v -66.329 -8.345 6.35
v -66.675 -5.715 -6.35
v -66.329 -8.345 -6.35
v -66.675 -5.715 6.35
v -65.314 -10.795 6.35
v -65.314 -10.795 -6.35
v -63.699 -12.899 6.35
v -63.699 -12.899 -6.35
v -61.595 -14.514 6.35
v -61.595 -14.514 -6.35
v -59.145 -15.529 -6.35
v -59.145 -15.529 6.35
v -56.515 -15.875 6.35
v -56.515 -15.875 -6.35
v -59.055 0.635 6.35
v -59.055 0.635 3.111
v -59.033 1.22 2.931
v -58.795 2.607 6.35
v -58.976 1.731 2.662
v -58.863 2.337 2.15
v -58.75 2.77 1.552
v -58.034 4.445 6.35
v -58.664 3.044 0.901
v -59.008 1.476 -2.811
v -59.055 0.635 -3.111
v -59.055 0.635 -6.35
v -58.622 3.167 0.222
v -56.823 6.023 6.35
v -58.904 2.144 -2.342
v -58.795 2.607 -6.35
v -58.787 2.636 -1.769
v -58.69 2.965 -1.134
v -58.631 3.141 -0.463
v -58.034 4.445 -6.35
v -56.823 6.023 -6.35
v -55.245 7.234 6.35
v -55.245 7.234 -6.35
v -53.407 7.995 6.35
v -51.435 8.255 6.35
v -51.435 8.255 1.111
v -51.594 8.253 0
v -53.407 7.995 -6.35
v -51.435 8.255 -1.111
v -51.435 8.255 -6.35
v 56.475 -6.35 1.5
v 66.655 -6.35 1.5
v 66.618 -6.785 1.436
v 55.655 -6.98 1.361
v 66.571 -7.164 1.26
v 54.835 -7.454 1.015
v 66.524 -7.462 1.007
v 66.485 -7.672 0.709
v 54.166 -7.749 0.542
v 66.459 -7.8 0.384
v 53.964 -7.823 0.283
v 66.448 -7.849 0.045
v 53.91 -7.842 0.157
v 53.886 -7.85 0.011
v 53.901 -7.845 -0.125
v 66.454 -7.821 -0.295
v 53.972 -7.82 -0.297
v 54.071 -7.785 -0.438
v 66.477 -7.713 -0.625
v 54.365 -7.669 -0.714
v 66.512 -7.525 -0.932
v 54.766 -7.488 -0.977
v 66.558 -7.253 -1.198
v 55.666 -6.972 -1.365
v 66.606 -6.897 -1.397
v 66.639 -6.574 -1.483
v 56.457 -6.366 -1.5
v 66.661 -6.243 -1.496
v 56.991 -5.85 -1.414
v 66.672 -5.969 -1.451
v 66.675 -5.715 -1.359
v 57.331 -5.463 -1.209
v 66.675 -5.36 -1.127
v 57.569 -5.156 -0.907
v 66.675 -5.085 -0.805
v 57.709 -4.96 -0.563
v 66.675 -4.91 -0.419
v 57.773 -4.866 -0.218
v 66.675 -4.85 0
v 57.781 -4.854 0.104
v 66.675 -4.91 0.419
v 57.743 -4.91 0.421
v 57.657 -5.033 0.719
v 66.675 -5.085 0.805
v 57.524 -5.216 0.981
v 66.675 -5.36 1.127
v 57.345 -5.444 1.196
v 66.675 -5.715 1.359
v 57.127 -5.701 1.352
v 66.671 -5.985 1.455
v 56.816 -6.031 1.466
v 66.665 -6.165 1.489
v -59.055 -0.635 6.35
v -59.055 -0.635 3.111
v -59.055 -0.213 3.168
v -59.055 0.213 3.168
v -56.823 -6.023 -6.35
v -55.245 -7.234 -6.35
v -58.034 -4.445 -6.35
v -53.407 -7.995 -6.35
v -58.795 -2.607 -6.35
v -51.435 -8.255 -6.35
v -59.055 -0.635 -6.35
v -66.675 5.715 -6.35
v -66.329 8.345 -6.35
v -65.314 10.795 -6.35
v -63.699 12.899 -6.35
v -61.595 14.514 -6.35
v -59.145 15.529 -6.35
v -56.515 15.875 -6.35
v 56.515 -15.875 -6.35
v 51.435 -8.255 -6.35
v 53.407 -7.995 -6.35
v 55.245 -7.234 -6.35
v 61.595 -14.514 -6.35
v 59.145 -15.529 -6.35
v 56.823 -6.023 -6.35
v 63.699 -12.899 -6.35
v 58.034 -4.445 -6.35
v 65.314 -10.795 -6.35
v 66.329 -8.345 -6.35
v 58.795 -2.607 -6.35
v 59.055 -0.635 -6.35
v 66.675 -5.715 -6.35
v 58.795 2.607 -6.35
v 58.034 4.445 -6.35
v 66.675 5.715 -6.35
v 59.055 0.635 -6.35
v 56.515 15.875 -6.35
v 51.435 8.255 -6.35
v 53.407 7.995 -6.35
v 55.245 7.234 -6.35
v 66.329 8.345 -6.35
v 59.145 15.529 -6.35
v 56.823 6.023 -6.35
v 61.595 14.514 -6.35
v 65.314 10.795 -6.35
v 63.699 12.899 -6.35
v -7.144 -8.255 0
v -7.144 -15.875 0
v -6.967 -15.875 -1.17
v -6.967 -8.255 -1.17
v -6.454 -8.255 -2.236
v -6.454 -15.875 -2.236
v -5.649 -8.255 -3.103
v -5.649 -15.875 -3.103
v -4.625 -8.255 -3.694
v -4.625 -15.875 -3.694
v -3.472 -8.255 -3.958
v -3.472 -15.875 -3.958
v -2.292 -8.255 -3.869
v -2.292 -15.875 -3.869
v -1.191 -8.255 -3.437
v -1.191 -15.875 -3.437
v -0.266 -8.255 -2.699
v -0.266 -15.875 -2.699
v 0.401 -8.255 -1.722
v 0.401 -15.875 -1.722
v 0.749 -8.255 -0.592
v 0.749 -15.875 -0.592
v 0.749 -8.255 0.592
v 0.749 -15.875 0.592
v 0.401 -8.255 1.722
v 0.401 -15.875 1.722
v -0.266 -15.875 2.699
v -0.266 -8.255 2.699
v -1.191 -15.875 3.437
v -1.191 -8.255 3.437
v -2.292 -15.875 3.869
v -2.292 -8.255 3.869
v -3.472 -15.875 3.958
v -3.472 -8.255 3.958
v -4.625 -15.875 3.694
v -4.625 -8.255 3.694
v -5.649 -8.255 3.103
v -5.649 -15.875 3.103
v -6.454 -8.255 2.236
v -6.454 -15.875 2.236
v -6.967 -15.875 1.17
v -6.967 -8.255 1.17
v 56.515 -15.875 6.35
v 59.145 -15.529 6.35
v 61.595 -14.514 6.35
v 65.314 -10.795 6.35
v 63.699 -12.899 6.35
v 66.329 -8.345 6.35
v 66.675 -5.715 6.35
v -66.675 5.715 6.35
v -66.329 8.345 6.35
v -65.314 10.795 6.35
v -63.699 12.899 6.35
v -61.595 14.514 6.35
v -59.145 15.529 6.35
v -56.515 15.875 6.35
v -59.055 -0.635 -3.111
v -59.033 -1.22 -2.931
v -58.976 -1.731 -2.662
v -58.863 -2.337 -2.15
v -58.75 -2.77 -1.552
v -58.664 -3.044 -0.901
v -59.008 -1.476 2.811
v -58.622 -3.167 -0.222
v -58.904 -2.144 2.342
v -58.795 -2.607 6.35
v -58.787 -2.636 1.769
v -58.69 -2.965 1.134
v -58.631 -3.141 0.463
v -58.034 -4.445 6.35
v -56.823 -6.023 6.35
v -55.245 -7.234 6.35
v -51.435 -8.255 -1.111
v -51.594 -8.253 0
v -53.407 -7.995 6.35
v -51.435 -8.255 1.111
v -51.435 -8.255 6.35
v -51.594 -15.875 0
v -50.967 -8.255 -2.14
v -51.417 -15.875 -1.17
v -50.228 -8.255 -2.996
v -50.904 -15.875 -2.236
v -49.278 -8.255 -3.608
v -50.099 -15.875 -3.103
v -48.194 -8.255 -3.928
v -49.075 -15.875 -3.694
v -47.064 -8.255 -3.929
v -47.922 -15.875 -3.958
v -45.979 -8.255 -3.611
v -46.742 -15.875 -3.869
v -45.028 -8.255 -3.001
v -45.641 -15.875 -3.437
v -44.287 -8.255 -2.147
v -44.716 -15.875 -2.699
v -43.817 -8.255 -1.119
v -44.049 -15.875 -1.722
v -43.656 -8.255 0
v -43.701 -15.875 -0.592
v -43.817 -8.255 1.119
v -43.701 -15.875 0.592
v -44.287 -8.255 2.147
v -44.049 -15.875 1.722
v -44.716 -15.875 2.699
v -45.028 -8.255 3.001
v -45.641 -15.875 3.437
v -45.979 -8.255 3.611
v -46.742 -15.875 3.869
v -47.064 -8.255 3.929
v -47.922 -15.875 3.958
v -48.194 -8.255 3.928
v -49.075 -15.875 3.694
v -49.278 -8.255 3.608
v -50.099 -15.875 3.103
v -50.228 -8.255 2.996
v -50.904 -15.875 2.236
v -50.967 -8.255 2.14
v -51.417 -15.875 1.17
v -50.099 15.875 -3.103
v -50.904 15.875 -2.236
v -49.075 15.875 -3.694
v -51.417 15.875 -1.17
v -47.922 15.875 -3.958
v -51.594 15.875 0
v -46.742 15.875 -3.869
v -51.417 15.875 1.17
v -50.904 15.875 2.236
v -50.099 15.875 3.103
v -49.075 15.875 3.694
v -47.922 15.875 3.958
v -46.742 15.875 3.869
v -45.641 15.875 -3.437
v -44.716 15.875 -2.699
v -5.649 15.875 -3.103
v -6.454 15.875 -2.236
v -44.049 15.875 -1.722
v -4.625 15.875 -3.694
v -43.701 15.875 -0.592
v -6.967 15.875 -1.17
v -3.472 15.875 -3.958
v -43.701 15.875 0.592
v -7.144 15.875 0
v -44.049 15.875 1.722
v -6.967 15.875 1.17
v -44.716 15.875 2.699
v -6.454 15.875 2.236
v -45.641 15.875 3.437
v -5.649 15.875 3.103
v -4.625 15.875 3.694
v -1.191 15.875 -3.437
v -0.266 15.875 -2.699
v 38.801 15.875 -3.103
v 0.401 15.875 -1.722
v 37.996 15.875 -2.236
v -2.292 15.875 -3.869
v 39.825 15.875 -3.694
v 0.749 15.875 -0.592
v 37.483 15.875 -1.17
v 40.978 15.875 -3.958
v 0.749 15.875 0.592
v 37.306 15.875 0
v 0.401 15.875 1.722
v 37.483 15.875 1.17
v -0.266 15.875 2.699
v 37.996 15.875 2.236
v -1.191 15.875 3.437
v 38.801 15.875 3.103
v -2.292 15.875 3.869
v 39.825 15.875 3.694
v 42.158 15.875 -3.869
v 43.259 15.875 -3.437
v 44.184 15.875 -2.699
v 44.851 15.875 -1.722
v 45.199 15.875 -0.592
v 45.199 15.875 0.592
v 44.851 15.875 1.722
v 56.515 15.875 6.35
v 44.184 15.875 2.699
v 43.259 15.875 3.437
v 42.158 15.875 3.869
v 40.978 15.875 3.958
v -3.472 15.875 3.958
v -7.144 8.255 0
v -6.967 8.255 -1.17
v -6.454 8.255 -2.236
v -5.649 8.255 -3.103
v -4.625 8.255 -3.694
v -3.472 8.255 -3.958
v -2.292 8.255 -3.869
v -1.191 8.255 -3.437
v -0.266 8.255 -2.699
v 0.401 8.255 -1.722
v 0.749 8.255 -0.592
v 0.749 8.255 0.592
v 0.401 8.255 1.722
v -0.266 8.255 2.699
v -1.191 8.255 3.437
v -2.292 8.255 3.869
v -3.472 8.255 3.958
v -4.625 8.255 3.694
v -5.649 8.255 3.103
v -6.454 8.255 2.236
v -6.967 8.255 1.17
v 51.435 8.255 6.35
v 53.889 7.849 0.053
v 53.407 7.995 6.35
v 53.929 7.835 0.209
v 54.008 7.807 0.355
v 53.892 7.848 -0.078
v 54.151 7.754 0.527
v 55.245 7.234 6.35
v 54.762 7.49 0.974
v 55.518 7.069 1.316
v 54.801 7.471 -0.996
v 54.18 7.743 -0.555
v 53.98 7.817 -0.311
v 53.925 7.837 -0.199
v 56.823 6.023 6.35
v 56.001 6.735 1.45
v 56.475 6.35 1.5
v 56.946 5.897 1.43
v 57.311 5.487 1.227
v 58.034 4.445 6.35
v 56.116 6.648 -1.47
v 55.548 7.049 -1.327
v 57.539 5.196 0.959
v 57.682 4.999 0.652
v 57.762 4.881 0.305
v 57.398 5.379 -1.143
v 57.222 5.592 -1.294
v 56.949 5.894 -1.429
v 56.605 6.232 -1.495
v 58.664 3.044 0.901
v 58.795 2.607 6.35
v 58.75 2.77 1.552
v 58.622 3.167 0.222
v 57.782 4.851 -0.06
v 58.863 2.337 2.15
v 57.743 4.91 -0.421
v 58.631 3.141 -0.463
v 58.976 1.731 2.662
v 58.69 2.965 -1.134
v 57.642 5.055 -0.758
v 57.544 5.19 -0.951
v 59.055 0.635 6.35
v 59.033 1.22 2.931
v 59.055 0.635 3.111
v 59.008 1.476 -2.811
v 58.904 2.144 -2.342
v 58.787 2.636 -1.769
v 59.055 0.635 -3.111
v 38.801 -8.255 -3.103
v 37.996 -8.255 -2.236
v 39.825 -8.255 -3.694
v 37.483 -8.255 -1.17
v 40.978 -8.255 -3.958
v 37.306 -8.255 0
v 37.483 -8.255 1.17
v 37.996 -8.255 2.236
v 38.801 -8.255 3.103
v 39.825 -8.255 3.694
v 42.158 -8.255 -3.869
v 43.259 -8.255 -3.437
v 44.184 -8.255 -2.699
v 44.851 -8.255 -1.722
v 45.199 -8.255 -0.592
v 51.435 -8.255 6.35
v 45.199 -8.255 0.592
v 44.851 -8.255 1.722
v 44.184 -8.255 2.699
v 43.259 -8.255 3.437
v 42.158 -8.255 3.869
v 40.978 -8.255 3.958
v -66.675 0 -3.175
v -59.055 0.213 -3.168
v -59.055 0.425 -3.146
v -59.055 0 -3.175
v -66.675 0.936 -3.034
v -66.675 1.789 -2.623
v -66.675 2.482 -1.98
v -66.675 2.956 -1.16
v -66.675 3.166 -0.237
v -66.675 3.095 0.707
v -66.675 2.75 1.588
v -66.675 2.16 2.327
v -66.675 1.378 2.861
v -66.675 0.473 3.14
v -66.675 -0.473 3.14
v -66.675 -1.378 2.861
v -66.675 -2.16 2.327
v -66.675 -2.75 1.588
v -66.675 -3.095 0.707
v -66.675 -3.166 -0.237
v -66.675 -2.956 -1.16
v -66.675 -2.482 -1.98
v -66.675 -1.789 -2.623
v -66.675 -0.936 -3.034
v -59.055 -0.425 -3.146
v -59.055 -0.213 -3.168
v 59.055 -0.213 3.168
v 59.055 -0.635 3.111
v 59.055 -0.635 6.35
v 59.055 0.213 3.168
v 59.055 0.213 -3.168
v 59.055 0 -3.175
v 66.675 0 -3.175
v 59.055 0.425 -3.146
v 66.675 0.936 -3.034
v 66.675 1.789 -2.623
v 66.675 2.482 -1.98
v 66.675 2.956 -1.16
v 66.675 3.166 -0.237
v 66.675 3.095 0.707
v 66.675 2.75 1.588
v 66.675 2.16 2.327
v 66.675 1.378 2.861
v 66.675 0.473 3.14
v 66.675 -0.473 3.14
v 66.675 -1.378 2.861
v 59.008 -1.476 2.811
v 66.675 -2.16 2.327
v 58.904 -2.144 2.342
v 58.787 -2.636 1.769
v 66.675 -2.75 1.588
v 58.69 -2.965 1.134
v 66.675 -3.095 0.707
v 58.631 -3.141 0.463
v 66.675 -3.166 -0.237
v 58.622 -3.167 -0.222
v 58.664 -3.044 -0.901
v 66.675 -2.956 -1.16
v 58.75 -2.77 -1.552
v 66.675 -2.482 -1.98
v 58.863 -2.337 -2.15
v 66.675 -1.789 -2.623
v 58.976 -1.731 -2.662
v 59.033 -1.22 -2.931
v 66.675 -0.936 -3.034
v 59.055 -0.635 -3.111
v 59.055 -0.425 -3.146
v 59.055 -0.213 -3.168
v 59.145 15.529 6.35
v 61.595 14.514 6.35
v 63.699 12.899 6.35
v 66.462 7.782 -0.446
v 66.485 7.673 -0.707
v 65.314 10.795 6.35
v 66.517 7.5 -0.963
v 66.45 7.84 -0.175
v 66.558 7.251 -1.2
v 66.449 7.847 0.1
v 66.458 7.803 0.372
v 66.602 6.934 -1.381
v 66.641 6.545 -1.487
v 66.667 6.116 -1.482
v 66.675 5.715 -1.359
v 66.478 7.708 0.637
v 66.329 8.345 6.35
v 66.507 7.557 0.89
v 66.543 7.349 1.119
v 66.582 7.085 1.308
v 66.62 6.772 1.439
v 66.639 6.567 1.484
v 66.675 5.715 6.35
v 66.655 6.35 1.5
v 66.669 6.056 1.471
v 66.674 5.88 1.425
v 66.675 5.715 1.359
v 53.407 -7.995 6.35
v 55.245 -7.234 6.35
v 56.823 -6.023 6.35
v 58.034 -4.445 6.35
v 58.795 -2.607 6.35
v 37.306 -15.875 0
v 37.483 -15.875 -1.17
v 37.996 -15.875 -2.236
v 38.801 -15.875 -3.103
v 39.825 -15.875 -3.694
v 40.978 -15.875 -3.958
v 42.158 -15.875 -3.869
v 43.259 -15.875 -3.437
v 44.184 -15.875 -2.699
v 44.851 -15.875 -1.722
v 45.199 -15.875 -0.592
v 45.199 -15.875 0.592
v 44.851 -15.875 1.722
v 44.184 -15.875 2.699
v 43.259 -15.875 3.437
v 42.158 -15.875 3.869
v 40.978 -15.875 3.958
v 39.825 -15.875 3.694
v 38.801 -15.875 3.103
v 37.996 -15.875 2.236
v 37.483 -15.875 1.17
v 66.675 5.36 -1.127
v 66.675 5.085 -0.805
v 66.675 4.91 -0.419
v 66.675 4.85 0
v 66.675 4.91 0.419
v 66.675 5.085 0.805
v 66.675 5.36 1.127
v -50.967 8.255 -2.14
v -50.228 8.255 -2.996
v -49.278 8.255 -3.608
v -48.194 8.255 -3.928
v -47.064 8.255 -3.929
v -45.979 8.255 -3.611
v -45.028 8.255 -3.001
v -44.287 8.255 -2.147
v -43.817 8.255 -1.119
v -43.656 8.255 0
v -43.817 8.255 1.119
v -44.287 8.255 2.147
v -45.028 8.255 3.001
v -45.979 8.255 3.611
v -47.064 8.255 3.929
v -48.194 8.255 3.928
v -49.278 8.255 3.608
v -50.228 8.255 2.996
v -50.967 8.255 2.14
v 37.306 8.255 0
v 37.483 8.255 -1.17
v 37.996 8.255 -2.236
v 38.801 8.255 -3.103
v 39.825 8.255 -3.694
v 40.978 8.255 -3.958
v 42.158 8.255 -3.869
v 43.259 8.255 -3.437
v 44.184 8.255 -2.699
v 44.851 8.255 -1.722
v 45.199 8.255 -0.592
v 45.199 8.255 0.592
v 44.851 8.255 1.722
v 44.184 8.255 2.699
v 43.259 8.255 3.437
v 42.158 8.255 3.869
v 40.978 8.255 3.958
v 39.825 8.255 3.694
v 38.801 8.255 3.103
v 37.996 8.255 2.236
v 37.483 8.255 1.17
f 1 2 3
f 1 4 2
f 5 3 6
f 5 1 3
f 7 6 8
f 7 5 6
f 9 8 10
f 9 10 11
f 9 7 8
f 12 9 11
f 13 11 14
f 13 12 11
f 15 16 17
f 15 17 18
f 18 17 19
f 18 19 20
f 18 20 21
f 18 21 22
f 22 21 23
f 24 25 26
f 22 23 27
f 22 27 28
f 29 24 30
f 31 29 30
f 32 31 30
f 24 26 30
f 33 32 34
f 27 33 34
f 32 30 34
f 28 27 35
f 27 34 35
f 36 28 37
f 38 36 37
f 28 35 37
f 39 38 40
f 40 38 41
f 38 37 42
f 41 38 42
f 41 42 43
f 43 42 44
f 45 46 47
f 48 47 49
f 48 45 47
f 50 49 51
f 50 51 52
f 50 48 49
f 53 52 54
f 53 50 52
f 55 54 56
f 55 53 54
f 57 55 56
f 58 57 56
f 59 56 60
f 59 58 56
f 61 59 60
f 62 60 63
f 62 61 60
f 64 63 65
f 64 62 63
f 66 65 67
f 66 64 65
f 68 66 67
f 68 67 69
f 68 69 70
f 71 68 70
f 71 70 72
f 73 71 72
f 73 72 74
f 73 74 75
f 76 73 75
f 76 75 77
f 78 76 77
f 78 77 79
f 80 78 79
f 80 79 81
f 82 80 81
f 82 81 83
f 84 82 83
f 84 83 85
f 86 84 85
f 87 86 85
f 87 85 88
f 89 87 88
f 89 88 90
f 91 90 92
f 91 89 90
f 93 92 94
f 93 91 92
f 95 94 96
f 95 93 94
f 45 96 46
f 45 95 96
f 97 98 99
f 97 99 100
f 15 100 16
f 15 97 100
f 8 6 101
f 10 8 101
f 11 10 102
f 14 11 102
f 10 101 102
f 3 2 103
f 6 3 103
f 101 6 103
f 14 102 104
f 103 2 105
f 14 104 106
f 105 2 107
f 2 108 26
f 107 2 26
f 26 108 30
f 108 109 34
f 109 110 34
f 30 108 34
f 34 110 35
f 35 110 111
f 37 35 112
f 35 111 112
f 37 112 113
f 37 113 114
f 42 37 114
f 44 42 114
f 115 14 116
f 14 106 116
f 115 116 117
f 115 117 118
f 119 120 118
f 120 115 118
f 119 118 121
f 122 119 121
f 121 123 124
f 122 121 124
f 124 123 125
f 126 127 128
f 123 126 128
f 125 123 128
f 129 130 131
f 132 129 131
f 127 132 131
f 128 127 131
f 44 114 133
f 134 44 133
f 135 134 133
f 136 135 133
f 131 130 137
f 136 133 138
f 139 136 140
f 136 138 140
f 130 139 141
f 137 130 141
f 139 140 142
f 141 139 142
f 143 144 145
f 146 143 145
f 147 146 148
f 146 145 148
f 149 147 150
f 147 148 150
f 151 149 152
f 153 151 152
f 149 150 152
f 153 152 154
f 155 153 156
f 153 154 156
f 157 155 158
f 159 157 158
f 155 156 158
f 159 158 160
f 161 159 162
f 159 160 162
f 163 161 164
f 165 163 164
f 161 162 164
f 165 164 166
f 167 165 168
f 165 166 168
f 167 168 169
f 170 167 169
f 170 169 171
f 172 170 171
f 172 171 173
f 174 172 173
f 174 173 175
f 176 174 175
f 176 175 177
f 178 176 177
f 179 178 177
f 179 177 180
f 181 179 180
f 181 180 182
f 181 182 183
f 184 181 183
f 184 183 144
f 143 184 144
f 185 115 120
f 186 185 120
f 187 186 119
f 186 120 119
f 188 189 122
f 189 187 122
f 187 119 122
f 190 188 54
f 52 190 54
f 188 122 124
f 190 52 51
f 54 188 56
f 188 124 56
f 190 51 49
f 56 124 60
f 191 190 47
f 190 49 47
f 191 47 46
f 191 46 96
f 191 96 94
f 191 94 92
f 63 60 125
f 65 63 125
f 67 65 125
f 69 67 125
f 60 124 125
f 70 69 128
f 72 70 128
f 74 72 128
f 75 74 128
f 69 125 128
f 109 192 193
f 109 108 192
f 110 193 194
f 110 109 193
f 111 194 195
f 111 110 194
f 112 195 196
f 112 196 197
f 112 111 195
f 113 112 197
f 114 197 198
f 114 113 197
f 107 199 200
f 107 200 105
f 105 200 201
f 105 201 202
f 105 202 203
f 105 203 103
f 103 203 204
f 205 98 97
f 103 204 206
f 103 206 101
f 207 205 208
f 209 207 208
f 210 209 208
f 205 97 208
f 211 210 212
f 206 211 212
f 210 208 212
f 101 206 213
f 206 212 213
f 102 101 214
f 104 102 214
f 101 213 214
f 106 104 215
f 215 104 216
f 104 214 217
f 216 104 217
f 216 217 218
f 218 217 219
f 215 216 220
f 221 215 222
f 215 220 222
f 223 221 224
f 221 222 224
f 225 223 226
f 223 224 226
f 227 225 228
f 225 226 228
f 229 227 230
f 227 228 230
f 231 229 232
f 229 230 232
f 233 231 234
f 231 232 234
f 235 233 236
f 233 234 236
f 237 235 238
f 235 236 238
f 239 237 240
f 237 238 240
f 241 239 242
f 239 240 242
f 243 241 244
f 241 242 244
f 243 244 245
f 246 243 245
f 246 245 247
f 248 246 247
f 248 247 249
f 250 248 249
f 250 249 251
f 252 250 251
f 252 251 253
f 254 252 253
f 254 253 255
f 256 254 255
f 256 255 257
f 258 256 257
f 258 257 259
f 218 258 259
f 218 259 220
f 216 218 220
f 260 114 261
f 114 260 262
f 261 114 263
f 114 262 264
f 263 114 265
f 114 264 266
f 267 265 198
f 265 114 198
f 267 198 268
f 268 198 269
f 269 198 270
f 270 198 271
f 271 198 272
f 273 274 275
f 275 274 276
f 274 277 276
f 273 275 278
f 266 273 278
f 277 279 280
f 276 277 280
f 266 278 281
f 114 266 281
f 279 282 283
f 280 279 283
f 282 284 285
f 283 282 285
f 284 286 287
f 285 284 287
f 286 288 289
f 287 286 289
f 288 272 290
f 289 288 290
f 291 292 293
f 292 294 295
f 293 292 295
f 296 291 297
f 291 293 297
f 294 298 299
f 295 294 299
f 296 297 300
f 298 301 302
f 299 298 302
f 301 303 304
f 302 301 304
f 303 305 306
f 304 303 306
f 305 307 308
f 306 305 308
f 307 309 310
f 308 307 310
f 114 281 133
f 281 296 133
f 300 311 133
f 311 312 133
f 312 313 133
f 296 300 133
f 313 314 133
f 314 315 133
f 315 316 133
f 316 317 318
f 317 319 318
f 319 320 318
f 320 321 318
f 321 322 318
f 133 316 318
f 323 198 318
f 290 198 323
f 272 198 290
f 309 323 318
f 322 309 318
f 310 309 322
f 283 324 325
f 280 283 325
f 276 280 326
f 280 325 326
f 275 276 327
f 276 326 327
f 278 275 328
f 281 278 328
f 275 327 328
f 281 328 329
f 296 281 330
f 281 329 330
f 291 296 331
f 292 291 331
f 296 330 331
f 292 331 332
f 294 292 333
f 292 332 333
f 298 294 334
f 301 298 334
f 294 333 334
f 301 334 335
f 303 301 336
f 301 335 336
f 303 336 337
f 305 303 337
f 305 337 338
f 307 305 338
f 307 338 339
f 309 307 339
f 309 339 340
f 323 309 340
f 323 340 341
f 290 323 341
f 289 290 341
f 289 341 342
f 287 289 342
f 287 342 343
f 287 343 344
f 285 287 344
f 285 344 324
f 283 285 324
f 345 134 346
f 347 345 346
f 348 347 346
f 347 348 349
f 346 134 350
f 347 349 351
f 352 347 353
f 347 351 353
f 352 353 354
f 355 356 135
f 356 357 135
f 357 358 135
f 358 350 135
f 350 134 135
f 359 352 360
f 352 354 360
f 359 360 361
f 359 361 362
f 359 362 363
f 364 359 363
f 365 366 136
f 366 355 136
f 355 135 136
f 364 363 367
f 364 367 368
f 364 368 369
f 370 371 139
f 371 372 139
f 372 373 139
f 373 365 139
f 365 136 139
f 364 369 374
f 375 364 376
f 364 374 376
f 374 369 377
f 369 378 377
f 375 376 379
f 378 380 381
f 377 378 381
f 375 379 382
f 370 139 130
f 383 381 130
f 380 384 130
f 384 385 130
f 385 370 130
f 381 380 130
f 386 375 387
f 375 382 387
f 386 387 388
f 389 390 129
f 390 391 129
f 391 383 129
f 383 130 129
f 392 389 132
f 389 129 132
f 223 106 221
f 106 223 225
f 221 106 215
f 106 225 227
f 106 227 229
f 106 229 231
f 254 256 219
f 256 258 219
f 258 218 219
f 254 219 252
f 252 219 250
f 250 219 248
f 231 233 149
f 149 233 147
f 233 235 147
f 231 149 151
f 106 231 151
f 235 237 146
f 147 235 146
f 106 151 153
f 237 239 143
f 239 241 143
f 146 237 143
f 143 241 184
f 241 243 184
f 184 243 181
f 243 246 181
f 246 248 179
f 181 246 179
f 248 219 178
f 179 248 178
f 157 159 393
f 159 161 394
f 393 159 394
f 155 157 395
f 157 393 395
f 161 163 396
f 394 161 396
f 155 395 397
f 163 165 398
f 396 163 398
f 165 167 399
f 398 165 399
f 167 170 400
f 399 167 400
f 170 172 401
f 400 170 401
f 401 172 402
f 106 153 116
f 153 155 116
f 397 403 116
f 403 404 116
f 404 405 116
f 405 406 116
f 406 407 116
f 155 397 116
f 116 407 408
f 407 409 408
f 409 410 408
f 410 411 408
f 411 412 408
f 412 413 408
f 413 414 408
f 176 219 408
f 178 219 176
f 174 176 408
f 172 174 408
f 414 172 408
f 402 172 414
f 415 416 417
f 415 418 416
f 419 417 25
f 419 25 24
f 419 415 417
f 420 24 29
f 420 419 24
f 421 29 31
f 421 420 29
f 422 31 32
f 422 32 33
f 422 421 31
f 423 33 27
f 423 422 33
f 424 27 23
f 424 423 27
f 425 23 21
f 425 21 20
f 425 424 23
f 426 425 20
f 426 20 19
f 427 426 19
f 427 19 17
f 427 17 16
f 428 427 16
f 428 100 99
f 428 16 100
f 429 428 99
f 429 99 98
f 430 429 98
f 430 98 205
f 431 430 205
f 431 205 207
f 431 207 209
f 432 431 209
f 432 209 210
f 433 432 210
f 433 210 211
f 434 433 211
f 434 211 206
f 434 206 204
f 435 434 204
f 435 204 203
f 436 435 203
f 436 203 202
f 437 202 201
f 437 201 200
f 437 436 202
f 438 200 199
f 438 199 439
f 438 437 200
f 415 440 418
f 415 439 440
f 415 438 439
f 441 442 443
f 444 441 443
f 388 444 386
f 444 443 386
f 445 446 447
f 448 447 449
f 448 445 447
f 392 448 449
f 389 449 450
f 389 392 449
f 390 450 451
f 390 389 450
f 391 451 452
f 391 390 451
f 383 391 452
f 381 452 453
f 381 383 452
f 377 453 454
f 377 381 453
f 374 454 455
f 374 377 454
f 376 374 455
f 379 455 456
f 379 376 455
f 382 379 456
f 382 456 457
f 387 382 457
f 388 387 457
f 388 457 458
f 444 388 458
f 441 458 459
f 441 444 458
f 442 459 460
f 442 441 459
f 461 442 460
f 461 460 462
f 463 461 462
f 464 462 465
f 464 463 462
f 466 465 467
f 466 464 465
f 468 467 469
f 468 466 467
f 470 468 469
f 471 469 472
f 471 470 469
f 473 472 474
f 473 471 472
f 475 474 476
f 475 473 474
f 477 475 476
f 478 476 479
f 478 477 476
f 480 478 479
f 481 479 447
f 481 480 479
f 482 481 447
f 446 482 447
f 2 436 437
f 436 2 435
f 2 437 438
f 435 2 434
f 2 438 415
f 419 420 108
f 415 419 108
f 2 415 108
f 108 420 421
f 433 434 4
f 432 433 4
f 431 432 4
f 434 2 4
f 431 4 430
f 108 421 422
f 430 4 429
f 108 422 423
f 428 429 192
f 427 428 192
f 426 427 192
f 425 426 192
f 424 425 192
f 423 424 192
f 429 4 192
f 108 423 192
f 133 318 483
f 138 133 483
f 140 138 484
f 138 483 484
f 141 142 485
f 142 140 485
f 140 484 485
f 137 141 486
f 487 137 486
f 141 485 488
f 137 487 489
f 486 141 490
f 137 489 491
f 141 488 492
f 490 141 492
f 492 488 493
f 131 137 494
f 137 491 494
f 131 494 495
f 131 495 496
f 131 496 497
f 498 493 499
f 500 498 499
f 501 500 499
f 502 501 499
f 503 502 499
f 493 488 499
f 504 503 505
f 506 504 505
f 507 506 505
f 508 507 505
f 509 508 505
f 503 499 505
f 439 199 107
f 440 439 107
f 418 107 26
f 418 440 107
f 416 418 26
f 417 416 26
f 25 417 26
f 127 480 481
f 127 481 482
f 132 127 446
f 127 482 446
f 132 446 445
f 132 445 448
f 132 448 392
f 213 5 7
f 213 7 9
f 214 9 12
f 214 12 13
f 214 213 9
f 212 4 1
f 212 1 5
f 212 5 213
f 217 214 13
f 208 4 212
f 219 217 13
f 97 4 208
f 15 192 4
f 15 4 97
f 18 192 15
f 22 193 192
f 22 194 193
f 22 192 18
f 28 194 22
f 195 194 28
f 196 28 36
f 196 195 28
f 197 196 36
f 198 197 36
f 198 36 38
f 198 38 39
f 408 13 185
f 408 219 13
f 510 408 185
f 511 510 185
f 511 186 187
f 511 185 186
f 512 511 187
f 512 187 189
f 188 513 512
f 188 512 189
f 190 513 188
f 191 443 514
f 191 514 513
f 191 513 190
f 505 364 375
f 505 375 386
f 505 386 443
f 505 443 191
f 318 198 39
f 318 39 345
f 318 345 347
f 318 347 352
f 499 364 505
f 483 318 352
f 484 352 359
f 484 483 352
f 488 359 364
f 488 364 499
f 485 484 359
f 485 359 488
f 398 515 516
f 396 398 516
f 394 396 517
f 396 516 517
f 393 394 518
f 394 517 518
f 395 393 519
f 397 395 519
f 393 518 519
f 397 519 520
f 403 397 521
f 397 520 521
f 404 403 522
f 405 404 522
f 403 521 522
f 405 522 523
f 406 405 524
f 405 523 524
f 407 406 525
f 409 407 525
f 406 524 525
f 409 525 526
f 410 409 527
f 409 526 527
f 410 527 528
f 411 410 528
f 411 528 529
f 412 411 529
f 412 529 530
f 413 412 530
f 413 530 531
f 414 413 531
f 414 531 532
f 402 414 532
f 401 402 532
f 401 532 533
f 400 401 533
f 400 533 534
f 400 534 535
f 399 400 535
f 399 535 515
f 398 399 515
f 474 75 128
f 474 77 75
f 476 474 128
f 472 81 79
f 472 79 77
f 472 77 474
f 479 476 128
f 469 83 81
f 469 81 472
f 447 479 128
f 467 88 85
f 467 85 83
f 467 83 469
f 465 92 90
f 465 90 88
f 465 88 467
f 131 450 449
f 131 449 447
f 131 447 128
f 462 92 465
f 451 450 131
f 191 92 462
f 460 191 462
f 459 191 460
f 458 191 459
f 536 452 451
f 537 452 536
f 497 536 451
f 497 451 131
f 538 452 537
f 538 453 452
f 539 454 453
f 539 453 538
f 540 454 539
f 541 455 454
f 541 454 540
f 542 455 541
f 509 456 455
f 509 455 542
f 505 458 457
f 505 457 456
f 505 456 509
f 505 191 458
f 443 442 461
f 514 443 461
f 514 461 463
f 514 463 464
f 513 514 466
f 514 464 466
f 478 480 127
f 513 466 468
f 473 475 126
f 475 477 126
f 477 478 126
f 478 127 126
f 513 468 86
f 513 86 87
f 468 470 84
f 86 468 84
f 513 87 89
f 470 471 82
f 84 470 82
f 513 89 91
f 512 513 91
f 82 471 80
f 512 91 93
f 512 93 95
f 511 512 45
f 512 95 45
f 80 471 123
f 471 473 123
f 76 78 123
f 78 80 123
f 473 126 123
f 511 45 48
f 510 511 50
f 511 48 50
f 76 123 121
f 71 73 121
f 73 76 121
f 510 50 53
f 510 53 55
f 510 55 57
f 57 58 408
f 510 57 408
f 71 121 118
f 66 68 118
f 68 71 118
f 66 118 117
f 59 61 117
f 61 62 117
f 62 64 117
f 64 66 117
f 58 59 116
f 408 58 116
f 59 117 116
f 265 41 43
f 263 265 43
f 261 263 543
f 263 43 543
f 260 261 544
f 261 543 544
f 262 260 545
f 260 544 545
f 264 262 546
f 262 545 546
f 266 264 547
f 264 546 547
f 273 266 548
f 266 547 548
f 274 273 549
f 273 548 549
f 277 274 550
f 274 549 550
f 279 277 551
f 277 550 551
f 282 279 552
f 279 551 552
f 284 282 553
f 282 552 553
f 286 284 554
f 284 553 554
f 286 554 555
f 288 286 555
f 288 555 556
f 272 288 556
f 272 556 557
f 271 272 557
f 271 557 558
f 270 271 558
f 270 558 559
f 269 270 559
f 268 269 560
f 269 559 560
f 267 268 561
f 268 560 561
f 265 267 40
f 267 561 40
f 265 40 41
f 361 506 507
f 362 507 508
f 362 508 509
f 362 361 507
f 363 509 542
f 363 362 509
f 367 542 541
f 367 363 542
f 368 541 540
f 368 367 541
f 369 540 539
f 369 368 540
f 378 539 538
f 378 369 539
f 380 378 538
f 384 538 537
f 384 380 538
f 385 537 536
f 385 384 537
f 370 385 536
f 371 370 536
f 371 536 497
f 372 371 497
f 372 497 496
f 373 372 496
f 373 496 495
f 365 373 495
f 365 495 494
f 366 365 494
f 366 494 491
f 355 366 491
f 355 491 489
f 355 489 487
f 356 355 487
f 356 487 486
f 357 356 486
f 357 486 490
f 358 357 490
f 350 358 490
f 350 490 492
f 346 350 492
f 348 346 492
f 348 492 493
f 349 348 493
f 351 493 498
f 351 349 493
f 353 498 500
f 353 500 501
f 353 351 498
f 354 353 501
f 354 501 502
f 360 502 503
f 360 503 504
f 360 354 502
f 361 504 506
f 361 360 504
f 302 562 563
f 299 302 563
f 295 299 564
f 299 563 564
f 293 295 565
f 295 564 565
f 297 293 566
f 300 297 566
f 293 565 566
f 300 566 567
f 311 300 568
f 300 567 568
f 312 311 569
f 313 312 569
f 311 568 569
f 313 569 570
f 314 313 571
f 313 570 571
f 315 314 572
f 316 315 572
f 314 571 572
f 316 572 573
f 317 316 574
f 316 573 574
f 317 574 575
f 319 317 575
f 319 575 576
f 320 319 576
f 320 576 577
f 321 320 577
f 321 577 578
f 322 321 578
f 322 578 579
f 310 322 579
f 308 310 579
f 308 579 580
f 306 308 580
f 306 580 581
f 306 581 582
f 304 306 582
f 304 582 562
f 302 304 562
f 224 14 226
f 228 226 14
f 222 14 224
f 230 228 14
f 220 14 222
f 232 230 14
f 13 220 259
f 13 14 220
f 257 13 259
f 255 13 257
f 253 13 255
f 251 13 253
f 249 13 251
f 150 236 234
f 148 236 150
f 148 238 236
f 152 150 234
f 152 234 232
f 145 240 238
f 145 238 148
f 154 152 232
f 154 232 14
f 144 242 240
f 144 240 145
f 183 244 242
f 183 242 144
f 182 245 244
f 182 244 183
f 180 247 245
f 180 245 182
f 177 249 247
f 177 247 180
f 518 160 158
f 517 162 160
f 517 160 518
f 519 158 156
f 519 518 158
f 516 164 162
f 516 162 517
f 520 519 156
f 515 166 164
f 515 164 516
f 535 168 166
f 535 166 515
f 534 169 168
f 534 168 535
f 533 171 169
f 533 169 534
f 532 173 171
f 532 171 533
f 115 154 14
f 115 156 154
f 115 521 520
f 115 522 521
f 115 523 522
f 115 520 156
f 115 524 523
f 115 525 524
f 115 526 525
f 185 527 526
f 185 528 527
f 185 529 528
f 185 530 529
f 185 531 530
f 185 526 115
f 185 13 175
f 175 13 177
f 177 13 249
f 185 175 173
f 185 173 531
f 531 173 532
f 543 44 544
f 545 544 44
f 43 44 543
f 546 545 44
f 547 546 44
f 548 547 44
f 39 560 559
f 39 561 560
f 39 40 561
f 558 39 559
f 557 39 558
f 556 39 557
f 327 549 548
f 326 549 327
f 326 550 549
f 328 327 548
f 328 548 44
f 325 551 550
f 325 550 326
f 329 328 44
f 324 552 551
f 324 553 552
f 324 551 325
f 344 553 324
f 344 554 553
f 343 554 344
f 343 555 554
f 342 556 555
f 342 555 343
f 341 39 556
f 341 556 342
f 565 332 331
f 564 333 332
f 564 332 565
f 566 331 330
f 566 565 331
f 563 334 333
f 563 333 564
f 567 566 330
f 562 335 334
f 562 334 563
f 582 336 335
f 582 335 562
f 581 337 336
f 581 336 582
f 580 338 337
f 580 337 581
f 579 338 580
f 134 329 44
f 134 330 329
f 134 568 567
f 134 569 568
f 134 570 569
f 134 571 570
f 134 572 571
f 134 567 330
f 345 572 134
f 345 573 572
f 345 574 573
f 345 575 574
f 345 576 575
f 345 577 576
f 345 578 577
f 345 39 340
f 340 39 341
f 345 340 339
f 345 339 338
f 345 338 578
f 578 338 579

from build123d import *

# Parameters (mm, degrees)
SKETCH1_W               = 133.35
SKETCH1_H               = 31.75
SKETCH1_W_2             = 118.11
SKETCH1_H_2             = 16.51
BOSS_EXTRUDE1_DEPTH     = 6.35
FILLET2_R               = 7.62
CUT_EXTRUDE1_DEPTH      = 69.832359759
CUT_EXTRUDE1_DEPTH_BACK = 69.832359759
SKETCH2_R               = 3.175
F_3_8_16_TAPPED_HOLE1_D = 7.9375
SKETCH5_R               = 1.5
CUT_EXTRUDE2_DEPTH      = 69.832359888
FILLET3_R               = 10.16
FILLET4_R               = 10.16
FILLET5_R               = 10.16
FILLET6_R               = 10.16


with BuildPart() as part:
    # Sketch1 → Boss-Extrude1 (new, symmetric)
    with BuildSketch(Plane.XY):
        Rectangle(SKETCH1_W, SKETCH1_H)
        Rectangle(SKETCH1_W_2, SKETCH1_H_2, mode=Mode.SUBTRACT)
    extrude(amount=BOSS_EXTRUDE1_DEPTH, both=True)

    # Fillet2
    fillet2_edges = [part.edges().sort_by_distance(p)[0] for p in [
        (59.055, -8.255, 0),
        (59.055, 8.255, 0),
        (-59.055, 8.255, 0),
        (-59.055, -8.255, 0),
    ]]
    fillet(fillet2_edges, radius=FILLET2_R)

    # Sketch2 → Cut-Extrude1 (cut, two sides: drawn at the far end of the back side and taken through both)
    with BuildSketch(Plane(origin=(0, 0, 0), x_dir=(0, 0, -1), z_dir=(1, 0, 0)).offset(-CUT_EXTRUDE1_DEPTH_BACK)):
        Circle(SKETCH2_R)
    extrude(amount=CUT_EXTRUDE1_DEPTH + CUT_EXTRUDE1_DEPTH_BACK, mode=Mode.SUBTRACT)

    # 3/8-16 Tapped Hole1 (through all)
    with Locations(Plane(origin=(0, 15.875, 0), x_dir=(1, 0, 0), z_dir=(0, 1, 0))):
        with Locations((-47.625, 0), (-3.175, 0), (41.275, 0)):
            Hole(F_3_8_16_TAPPED_HOLE1_D / 2)

    # Sketch5 → Cut-Extrude2 (cut, through all)
    with BuildSketch(Plane(origin=(0, 0, 0), x_dir=(0, 0, -1), z_dir=(1, 0, 0))):
        with Locations(Location((0, -6.35, 0), (0, 0, 180))):
            Circle(SKETCH5_R)
        with Locations(Location((0, 6.35, 0), (0, 0, 180))):
            Circle(SKETCH5_R)
    extrude(amount=CUT_EXTRUDE2_DEPTH, mode=Mode.SUBTRACT)

    # Fillet3
    fillet3_edges = [part.edges().sort_by_distance(p)[0] for p in [
        (-66.675, 15.875, 0),
    ]]
    fillet(fillet3_edges, radius=FILLET3_R)

    # Fillet4
    fillet4_edges = [part.edges().sort_by_distance(p)[0] for p in [
        (-66.675, -15.875, 0),
    ]]
    fillet(fillet4_edges, radius=FILLET4_R)

    # Fillet5
    # the kernel refuses this fillet: 10.16 mm, written as the material it takes off along each edge
    with BuildSketch(Plane(origin=(66.675, -15.875, -31.75), x_dir=(-1, 0, 0), z_dir=(0, 0, 1))) as fillet5_piece_1:
        with BuildLine():
            CenterArc((FILLET5_R, -FILLET5_R), FILLET5_R, 90, 90)
            Line((0, -FILLET5_R), (0, 0))
            Line((0, 0), (FILLET5_R, 0))
        make_face()
    extrude(amount=63.5, mode=Mode.SUBTRACT)

    # Fillet6
    # the kernel refuses this fillet: 10.16 mm, written as the material it takes off along each edge
    with BuildSketch(Plane(origin=(66.675, 15.875, 31.75), x_dir=(0, -1, 0), z_dir=(0, 0, -1))) as fillet6_piece_1:
        with BuildLine():
            CenterArc((FILLET6_R, FILLET6_R), FILLET6_R, 180, 90)
            Line((0, FILLET6_R), (0, 0))
            Line((0, 0), (FILLET6_R, 0))
        make_face()
    extrude(amount=63.5, mode=Mode.SUBTRACT)


solid = part.part
